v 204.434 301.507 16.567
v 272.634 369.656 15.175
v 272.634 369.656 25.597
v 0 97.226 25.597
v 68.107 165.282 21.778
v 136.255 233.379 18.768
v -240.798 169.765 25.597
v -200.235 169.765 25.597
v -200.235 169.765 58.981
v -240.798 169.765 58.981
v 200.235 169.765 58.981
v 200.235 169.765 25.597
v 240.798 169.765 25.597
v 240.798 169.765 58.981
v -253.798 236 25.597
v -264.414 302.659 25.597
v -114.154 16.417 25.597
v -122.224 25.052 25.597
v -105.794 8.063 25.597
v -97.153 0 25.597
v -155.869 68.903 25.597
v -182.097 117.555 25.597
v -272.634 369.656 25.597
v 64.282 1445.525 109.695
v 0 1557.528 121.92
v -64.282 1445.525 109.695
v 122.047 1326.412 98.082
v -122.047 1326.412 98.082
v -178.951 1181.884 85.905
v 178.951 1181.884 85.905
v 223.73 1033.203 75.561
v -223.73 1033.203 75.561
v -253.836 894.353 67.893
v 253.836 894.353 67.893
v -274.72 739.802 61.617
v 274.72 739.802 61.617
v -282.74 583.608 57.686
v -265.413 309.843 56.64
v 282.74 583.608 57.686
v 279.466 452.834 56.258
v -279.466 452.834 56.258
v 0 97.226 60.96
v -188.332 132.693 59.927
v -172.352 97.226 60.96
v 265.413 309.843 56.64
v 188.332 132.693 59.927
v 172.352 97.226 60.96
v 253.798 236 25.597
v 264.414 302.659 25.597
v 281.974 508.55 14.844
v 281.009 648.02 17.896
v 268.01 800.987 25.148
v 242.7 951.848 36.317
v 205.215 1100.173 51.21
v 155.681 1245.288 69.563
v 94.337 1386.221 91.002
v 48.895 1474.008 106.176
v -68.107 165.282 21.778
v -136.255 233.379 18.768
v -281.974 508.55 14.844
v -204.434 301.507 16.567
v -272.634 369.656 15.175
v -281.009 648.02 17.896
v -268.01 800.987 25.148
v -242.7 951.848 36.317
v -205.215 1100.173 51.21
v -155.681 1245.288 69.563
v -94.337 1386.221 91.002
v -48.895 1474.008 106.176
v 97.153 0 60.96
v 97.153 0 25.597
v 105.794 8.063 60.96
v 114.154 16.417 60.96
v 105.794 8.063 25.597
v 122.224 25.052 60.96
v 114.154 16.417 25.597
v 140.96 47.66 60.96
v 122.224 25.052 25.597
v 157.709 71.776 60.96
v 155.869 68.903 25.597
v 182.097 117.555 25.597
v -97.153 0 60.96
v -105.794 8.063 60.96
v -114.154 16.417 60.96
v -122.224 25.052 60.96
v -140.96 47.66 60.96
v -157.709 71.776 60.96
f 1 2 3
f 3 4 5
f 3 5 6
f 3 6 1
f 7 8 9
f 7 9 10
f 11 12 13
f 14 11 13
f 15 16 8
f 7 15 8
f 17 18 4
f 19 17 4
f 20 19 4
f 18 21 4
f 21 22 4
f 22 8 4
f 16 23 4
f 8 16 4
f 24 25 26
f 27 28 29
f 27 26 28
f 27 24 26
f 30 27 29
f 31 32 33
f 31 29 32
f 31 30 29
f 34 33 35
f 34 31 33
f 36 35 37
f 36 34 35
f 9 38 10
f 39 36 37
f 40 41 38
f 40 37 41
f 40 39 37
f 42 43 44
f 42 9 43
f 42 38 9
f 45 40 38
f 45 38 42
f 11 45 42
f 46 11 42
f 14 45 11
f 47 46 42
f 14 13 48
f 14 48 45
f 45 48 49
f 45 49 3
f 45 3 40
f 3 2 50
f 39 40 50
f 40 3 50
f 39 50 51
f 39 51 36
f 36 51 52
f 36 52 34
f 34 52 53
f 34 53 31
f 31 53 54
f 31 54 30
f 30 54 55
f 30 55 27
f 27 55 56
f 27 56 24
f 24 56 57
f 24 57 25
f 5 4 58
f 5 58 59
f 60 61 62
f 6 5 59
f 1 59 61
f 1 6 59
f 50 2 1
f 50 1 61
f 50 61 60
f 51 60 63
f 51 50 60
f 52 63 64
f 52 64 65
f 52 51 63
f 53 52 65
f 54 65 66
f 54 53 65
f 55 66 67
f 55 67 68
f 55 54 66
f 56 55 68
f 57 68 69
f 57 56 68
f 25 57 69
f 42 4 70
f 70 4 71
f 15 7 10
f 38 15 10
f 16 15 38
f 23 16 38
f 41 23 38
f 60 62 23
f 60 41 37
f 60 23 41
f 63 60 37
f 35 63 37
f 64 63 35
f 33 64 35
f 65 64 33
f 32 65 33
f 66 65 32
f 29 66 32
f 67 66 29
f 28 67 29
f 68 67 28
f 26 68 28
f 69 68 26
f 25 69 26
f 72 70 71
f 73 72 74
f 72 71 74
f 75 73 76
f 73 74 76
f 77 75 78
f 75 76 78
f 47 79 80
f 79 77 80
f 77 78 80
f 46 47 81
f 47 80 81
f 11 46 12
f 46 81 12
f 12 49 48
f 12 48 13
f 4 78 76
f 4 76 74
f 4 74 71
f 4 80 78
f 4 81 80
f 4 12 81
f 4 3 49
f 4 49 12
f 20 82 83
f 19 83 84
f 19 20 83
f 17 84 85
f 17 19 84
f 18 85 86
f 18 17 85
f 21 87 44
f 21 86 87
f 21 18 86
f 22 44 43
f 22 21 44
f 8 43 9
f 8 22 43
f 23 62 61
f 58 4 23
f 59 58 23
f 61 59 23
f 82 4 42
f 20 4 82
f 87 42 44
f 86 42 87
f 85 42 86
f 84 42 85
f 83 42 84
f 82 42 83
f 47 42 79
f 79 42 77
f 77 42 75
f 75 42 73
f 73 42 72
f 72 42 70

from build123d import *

# Parameters (mm, degrees)
F1_DEPTH  = 121.92
F3_DEPTH  = 282.829943269
F4_W      = 137.4469886072
F4_H      = 60.96
F4_H_2    = 25.5973618478
F5_DEPTH  = 1232.2696308848
F6_W      = 35.4420293589
F6_H      = 60.96
F5_FACE_W = 35.4420293589
F5_FACE_H = 25.5973618478
F7_DEPTH  = 131.2443939971


with BuildPart() as f1:
    # F0 (on Top) → F1 (new body)
    with BuildSketch(Plane.XY):
        with BuildLine():
            Line((0, 1557.528), (0, 97.2259938717))
            Line((0, 97.2259938717), (97.1533879638, 0))
            ThreePointArc((97.1533879638, 0), (161.1479027225, 77.3205102489), (200.2349644899, 169.7648763657))
            Line((200.2349644899, 169.7648763657), (240.7975746215, 169.7648763657))
            ThreePointArc((240.7975746215, 169.7648763657), (255.122674282, 887.0230394729), (0, 1557.528))
        make_face()
    extrude(amount=F1_DEPTH)

    # F2 (on face) → F3 (cut, through all)
    with BuildSketch(Plane(origin=(0, 0, 0), x_dir=(0, -1, 0), z_dir=(-1, 0, 0))):
        with BuildLine():
            Line((-97.2259938717, 121.92), (-1557.528, 121.92))
            ThreePointArc((-1557.528, 121.92), (-828.4837557125, 64.9274989858), (-97.2259938717, 60.96))
            Line((-97.2259938717, 60.96), (-97.2259938717, 121.92))
        make_face()
        with BuildLine():
            ThreePointArc((-97.2259938717, 25.5973618478), (-830.4601765145, 27.0160520849), (-1557.528, 121.92))
            Line((-1557.528, 121.92), (-1557.528, 0))
            Line((-1557.528, 0), (-97.2259938717, 0))
            Line((-97.2259938717, 0), (-97.2259938717, 25.5973618478))
        make_face()
    extrude(amount=-F3_DEPTH, mode=Mode.SUBTRACT)

    # F4 (on face) → F5 (cut, through all)
    with BuildSketch(Plane(origin=(48.6129833707, 48.5766804268, 0), x_dir=(0.7068426085, -0.7073708552, 0), z_dir=(-0.7073708552, -0.7068426085, 0))):
        with Locations((-0.0513401263, 91.44)):
            Rectangle(F4_W, F4_H)
        with Locations((-0.0513401263, 12.7986809239)):
            Rectangle(F4_W, F4_H_2)
    extrude(amount=-F5_DEPTH, mode=Mode.SUBTRACT)

    # F6 (on face) + F5_face (on face) → F7 (cut, through all)
    with BuildSketch(Plane(origin=(48.5404045931, -48.5766804268, 0), x_dir=(-0.7073708552, -0.7068426085, 0), z_dir=(-0.7068426085, 0.7073708552, 0))):
        with Locations((-86.4444898061, 91.44)):
            Rectangle(F6_W, F6_H)
    with BuildSketch(Plane(origin=(109.6887172721, 12.5259682421, 91.44), x_dir=(-0.7073708552, -0.7068426085, 0), z_dir=(-0.7068426085, 0.7073708552, 0))):
        with Locations((0, -78.6413190761)):
            Rectangle(F5_FACE_W, F5_FACE_H)
    extrude(amount=-F7_DEPTH, mode=Mode.SUBTRACT)

    # F8: F1 across face


with BuildPart() as f1_1:
    add(f1.part)
    add(f1.part.mirror(Plane(origin=(0, 690.8470850267, 48.623085259), x_dir=(0, -1, 0), z_dir=(-1, 0, 0))))


solid = f1_1.part
